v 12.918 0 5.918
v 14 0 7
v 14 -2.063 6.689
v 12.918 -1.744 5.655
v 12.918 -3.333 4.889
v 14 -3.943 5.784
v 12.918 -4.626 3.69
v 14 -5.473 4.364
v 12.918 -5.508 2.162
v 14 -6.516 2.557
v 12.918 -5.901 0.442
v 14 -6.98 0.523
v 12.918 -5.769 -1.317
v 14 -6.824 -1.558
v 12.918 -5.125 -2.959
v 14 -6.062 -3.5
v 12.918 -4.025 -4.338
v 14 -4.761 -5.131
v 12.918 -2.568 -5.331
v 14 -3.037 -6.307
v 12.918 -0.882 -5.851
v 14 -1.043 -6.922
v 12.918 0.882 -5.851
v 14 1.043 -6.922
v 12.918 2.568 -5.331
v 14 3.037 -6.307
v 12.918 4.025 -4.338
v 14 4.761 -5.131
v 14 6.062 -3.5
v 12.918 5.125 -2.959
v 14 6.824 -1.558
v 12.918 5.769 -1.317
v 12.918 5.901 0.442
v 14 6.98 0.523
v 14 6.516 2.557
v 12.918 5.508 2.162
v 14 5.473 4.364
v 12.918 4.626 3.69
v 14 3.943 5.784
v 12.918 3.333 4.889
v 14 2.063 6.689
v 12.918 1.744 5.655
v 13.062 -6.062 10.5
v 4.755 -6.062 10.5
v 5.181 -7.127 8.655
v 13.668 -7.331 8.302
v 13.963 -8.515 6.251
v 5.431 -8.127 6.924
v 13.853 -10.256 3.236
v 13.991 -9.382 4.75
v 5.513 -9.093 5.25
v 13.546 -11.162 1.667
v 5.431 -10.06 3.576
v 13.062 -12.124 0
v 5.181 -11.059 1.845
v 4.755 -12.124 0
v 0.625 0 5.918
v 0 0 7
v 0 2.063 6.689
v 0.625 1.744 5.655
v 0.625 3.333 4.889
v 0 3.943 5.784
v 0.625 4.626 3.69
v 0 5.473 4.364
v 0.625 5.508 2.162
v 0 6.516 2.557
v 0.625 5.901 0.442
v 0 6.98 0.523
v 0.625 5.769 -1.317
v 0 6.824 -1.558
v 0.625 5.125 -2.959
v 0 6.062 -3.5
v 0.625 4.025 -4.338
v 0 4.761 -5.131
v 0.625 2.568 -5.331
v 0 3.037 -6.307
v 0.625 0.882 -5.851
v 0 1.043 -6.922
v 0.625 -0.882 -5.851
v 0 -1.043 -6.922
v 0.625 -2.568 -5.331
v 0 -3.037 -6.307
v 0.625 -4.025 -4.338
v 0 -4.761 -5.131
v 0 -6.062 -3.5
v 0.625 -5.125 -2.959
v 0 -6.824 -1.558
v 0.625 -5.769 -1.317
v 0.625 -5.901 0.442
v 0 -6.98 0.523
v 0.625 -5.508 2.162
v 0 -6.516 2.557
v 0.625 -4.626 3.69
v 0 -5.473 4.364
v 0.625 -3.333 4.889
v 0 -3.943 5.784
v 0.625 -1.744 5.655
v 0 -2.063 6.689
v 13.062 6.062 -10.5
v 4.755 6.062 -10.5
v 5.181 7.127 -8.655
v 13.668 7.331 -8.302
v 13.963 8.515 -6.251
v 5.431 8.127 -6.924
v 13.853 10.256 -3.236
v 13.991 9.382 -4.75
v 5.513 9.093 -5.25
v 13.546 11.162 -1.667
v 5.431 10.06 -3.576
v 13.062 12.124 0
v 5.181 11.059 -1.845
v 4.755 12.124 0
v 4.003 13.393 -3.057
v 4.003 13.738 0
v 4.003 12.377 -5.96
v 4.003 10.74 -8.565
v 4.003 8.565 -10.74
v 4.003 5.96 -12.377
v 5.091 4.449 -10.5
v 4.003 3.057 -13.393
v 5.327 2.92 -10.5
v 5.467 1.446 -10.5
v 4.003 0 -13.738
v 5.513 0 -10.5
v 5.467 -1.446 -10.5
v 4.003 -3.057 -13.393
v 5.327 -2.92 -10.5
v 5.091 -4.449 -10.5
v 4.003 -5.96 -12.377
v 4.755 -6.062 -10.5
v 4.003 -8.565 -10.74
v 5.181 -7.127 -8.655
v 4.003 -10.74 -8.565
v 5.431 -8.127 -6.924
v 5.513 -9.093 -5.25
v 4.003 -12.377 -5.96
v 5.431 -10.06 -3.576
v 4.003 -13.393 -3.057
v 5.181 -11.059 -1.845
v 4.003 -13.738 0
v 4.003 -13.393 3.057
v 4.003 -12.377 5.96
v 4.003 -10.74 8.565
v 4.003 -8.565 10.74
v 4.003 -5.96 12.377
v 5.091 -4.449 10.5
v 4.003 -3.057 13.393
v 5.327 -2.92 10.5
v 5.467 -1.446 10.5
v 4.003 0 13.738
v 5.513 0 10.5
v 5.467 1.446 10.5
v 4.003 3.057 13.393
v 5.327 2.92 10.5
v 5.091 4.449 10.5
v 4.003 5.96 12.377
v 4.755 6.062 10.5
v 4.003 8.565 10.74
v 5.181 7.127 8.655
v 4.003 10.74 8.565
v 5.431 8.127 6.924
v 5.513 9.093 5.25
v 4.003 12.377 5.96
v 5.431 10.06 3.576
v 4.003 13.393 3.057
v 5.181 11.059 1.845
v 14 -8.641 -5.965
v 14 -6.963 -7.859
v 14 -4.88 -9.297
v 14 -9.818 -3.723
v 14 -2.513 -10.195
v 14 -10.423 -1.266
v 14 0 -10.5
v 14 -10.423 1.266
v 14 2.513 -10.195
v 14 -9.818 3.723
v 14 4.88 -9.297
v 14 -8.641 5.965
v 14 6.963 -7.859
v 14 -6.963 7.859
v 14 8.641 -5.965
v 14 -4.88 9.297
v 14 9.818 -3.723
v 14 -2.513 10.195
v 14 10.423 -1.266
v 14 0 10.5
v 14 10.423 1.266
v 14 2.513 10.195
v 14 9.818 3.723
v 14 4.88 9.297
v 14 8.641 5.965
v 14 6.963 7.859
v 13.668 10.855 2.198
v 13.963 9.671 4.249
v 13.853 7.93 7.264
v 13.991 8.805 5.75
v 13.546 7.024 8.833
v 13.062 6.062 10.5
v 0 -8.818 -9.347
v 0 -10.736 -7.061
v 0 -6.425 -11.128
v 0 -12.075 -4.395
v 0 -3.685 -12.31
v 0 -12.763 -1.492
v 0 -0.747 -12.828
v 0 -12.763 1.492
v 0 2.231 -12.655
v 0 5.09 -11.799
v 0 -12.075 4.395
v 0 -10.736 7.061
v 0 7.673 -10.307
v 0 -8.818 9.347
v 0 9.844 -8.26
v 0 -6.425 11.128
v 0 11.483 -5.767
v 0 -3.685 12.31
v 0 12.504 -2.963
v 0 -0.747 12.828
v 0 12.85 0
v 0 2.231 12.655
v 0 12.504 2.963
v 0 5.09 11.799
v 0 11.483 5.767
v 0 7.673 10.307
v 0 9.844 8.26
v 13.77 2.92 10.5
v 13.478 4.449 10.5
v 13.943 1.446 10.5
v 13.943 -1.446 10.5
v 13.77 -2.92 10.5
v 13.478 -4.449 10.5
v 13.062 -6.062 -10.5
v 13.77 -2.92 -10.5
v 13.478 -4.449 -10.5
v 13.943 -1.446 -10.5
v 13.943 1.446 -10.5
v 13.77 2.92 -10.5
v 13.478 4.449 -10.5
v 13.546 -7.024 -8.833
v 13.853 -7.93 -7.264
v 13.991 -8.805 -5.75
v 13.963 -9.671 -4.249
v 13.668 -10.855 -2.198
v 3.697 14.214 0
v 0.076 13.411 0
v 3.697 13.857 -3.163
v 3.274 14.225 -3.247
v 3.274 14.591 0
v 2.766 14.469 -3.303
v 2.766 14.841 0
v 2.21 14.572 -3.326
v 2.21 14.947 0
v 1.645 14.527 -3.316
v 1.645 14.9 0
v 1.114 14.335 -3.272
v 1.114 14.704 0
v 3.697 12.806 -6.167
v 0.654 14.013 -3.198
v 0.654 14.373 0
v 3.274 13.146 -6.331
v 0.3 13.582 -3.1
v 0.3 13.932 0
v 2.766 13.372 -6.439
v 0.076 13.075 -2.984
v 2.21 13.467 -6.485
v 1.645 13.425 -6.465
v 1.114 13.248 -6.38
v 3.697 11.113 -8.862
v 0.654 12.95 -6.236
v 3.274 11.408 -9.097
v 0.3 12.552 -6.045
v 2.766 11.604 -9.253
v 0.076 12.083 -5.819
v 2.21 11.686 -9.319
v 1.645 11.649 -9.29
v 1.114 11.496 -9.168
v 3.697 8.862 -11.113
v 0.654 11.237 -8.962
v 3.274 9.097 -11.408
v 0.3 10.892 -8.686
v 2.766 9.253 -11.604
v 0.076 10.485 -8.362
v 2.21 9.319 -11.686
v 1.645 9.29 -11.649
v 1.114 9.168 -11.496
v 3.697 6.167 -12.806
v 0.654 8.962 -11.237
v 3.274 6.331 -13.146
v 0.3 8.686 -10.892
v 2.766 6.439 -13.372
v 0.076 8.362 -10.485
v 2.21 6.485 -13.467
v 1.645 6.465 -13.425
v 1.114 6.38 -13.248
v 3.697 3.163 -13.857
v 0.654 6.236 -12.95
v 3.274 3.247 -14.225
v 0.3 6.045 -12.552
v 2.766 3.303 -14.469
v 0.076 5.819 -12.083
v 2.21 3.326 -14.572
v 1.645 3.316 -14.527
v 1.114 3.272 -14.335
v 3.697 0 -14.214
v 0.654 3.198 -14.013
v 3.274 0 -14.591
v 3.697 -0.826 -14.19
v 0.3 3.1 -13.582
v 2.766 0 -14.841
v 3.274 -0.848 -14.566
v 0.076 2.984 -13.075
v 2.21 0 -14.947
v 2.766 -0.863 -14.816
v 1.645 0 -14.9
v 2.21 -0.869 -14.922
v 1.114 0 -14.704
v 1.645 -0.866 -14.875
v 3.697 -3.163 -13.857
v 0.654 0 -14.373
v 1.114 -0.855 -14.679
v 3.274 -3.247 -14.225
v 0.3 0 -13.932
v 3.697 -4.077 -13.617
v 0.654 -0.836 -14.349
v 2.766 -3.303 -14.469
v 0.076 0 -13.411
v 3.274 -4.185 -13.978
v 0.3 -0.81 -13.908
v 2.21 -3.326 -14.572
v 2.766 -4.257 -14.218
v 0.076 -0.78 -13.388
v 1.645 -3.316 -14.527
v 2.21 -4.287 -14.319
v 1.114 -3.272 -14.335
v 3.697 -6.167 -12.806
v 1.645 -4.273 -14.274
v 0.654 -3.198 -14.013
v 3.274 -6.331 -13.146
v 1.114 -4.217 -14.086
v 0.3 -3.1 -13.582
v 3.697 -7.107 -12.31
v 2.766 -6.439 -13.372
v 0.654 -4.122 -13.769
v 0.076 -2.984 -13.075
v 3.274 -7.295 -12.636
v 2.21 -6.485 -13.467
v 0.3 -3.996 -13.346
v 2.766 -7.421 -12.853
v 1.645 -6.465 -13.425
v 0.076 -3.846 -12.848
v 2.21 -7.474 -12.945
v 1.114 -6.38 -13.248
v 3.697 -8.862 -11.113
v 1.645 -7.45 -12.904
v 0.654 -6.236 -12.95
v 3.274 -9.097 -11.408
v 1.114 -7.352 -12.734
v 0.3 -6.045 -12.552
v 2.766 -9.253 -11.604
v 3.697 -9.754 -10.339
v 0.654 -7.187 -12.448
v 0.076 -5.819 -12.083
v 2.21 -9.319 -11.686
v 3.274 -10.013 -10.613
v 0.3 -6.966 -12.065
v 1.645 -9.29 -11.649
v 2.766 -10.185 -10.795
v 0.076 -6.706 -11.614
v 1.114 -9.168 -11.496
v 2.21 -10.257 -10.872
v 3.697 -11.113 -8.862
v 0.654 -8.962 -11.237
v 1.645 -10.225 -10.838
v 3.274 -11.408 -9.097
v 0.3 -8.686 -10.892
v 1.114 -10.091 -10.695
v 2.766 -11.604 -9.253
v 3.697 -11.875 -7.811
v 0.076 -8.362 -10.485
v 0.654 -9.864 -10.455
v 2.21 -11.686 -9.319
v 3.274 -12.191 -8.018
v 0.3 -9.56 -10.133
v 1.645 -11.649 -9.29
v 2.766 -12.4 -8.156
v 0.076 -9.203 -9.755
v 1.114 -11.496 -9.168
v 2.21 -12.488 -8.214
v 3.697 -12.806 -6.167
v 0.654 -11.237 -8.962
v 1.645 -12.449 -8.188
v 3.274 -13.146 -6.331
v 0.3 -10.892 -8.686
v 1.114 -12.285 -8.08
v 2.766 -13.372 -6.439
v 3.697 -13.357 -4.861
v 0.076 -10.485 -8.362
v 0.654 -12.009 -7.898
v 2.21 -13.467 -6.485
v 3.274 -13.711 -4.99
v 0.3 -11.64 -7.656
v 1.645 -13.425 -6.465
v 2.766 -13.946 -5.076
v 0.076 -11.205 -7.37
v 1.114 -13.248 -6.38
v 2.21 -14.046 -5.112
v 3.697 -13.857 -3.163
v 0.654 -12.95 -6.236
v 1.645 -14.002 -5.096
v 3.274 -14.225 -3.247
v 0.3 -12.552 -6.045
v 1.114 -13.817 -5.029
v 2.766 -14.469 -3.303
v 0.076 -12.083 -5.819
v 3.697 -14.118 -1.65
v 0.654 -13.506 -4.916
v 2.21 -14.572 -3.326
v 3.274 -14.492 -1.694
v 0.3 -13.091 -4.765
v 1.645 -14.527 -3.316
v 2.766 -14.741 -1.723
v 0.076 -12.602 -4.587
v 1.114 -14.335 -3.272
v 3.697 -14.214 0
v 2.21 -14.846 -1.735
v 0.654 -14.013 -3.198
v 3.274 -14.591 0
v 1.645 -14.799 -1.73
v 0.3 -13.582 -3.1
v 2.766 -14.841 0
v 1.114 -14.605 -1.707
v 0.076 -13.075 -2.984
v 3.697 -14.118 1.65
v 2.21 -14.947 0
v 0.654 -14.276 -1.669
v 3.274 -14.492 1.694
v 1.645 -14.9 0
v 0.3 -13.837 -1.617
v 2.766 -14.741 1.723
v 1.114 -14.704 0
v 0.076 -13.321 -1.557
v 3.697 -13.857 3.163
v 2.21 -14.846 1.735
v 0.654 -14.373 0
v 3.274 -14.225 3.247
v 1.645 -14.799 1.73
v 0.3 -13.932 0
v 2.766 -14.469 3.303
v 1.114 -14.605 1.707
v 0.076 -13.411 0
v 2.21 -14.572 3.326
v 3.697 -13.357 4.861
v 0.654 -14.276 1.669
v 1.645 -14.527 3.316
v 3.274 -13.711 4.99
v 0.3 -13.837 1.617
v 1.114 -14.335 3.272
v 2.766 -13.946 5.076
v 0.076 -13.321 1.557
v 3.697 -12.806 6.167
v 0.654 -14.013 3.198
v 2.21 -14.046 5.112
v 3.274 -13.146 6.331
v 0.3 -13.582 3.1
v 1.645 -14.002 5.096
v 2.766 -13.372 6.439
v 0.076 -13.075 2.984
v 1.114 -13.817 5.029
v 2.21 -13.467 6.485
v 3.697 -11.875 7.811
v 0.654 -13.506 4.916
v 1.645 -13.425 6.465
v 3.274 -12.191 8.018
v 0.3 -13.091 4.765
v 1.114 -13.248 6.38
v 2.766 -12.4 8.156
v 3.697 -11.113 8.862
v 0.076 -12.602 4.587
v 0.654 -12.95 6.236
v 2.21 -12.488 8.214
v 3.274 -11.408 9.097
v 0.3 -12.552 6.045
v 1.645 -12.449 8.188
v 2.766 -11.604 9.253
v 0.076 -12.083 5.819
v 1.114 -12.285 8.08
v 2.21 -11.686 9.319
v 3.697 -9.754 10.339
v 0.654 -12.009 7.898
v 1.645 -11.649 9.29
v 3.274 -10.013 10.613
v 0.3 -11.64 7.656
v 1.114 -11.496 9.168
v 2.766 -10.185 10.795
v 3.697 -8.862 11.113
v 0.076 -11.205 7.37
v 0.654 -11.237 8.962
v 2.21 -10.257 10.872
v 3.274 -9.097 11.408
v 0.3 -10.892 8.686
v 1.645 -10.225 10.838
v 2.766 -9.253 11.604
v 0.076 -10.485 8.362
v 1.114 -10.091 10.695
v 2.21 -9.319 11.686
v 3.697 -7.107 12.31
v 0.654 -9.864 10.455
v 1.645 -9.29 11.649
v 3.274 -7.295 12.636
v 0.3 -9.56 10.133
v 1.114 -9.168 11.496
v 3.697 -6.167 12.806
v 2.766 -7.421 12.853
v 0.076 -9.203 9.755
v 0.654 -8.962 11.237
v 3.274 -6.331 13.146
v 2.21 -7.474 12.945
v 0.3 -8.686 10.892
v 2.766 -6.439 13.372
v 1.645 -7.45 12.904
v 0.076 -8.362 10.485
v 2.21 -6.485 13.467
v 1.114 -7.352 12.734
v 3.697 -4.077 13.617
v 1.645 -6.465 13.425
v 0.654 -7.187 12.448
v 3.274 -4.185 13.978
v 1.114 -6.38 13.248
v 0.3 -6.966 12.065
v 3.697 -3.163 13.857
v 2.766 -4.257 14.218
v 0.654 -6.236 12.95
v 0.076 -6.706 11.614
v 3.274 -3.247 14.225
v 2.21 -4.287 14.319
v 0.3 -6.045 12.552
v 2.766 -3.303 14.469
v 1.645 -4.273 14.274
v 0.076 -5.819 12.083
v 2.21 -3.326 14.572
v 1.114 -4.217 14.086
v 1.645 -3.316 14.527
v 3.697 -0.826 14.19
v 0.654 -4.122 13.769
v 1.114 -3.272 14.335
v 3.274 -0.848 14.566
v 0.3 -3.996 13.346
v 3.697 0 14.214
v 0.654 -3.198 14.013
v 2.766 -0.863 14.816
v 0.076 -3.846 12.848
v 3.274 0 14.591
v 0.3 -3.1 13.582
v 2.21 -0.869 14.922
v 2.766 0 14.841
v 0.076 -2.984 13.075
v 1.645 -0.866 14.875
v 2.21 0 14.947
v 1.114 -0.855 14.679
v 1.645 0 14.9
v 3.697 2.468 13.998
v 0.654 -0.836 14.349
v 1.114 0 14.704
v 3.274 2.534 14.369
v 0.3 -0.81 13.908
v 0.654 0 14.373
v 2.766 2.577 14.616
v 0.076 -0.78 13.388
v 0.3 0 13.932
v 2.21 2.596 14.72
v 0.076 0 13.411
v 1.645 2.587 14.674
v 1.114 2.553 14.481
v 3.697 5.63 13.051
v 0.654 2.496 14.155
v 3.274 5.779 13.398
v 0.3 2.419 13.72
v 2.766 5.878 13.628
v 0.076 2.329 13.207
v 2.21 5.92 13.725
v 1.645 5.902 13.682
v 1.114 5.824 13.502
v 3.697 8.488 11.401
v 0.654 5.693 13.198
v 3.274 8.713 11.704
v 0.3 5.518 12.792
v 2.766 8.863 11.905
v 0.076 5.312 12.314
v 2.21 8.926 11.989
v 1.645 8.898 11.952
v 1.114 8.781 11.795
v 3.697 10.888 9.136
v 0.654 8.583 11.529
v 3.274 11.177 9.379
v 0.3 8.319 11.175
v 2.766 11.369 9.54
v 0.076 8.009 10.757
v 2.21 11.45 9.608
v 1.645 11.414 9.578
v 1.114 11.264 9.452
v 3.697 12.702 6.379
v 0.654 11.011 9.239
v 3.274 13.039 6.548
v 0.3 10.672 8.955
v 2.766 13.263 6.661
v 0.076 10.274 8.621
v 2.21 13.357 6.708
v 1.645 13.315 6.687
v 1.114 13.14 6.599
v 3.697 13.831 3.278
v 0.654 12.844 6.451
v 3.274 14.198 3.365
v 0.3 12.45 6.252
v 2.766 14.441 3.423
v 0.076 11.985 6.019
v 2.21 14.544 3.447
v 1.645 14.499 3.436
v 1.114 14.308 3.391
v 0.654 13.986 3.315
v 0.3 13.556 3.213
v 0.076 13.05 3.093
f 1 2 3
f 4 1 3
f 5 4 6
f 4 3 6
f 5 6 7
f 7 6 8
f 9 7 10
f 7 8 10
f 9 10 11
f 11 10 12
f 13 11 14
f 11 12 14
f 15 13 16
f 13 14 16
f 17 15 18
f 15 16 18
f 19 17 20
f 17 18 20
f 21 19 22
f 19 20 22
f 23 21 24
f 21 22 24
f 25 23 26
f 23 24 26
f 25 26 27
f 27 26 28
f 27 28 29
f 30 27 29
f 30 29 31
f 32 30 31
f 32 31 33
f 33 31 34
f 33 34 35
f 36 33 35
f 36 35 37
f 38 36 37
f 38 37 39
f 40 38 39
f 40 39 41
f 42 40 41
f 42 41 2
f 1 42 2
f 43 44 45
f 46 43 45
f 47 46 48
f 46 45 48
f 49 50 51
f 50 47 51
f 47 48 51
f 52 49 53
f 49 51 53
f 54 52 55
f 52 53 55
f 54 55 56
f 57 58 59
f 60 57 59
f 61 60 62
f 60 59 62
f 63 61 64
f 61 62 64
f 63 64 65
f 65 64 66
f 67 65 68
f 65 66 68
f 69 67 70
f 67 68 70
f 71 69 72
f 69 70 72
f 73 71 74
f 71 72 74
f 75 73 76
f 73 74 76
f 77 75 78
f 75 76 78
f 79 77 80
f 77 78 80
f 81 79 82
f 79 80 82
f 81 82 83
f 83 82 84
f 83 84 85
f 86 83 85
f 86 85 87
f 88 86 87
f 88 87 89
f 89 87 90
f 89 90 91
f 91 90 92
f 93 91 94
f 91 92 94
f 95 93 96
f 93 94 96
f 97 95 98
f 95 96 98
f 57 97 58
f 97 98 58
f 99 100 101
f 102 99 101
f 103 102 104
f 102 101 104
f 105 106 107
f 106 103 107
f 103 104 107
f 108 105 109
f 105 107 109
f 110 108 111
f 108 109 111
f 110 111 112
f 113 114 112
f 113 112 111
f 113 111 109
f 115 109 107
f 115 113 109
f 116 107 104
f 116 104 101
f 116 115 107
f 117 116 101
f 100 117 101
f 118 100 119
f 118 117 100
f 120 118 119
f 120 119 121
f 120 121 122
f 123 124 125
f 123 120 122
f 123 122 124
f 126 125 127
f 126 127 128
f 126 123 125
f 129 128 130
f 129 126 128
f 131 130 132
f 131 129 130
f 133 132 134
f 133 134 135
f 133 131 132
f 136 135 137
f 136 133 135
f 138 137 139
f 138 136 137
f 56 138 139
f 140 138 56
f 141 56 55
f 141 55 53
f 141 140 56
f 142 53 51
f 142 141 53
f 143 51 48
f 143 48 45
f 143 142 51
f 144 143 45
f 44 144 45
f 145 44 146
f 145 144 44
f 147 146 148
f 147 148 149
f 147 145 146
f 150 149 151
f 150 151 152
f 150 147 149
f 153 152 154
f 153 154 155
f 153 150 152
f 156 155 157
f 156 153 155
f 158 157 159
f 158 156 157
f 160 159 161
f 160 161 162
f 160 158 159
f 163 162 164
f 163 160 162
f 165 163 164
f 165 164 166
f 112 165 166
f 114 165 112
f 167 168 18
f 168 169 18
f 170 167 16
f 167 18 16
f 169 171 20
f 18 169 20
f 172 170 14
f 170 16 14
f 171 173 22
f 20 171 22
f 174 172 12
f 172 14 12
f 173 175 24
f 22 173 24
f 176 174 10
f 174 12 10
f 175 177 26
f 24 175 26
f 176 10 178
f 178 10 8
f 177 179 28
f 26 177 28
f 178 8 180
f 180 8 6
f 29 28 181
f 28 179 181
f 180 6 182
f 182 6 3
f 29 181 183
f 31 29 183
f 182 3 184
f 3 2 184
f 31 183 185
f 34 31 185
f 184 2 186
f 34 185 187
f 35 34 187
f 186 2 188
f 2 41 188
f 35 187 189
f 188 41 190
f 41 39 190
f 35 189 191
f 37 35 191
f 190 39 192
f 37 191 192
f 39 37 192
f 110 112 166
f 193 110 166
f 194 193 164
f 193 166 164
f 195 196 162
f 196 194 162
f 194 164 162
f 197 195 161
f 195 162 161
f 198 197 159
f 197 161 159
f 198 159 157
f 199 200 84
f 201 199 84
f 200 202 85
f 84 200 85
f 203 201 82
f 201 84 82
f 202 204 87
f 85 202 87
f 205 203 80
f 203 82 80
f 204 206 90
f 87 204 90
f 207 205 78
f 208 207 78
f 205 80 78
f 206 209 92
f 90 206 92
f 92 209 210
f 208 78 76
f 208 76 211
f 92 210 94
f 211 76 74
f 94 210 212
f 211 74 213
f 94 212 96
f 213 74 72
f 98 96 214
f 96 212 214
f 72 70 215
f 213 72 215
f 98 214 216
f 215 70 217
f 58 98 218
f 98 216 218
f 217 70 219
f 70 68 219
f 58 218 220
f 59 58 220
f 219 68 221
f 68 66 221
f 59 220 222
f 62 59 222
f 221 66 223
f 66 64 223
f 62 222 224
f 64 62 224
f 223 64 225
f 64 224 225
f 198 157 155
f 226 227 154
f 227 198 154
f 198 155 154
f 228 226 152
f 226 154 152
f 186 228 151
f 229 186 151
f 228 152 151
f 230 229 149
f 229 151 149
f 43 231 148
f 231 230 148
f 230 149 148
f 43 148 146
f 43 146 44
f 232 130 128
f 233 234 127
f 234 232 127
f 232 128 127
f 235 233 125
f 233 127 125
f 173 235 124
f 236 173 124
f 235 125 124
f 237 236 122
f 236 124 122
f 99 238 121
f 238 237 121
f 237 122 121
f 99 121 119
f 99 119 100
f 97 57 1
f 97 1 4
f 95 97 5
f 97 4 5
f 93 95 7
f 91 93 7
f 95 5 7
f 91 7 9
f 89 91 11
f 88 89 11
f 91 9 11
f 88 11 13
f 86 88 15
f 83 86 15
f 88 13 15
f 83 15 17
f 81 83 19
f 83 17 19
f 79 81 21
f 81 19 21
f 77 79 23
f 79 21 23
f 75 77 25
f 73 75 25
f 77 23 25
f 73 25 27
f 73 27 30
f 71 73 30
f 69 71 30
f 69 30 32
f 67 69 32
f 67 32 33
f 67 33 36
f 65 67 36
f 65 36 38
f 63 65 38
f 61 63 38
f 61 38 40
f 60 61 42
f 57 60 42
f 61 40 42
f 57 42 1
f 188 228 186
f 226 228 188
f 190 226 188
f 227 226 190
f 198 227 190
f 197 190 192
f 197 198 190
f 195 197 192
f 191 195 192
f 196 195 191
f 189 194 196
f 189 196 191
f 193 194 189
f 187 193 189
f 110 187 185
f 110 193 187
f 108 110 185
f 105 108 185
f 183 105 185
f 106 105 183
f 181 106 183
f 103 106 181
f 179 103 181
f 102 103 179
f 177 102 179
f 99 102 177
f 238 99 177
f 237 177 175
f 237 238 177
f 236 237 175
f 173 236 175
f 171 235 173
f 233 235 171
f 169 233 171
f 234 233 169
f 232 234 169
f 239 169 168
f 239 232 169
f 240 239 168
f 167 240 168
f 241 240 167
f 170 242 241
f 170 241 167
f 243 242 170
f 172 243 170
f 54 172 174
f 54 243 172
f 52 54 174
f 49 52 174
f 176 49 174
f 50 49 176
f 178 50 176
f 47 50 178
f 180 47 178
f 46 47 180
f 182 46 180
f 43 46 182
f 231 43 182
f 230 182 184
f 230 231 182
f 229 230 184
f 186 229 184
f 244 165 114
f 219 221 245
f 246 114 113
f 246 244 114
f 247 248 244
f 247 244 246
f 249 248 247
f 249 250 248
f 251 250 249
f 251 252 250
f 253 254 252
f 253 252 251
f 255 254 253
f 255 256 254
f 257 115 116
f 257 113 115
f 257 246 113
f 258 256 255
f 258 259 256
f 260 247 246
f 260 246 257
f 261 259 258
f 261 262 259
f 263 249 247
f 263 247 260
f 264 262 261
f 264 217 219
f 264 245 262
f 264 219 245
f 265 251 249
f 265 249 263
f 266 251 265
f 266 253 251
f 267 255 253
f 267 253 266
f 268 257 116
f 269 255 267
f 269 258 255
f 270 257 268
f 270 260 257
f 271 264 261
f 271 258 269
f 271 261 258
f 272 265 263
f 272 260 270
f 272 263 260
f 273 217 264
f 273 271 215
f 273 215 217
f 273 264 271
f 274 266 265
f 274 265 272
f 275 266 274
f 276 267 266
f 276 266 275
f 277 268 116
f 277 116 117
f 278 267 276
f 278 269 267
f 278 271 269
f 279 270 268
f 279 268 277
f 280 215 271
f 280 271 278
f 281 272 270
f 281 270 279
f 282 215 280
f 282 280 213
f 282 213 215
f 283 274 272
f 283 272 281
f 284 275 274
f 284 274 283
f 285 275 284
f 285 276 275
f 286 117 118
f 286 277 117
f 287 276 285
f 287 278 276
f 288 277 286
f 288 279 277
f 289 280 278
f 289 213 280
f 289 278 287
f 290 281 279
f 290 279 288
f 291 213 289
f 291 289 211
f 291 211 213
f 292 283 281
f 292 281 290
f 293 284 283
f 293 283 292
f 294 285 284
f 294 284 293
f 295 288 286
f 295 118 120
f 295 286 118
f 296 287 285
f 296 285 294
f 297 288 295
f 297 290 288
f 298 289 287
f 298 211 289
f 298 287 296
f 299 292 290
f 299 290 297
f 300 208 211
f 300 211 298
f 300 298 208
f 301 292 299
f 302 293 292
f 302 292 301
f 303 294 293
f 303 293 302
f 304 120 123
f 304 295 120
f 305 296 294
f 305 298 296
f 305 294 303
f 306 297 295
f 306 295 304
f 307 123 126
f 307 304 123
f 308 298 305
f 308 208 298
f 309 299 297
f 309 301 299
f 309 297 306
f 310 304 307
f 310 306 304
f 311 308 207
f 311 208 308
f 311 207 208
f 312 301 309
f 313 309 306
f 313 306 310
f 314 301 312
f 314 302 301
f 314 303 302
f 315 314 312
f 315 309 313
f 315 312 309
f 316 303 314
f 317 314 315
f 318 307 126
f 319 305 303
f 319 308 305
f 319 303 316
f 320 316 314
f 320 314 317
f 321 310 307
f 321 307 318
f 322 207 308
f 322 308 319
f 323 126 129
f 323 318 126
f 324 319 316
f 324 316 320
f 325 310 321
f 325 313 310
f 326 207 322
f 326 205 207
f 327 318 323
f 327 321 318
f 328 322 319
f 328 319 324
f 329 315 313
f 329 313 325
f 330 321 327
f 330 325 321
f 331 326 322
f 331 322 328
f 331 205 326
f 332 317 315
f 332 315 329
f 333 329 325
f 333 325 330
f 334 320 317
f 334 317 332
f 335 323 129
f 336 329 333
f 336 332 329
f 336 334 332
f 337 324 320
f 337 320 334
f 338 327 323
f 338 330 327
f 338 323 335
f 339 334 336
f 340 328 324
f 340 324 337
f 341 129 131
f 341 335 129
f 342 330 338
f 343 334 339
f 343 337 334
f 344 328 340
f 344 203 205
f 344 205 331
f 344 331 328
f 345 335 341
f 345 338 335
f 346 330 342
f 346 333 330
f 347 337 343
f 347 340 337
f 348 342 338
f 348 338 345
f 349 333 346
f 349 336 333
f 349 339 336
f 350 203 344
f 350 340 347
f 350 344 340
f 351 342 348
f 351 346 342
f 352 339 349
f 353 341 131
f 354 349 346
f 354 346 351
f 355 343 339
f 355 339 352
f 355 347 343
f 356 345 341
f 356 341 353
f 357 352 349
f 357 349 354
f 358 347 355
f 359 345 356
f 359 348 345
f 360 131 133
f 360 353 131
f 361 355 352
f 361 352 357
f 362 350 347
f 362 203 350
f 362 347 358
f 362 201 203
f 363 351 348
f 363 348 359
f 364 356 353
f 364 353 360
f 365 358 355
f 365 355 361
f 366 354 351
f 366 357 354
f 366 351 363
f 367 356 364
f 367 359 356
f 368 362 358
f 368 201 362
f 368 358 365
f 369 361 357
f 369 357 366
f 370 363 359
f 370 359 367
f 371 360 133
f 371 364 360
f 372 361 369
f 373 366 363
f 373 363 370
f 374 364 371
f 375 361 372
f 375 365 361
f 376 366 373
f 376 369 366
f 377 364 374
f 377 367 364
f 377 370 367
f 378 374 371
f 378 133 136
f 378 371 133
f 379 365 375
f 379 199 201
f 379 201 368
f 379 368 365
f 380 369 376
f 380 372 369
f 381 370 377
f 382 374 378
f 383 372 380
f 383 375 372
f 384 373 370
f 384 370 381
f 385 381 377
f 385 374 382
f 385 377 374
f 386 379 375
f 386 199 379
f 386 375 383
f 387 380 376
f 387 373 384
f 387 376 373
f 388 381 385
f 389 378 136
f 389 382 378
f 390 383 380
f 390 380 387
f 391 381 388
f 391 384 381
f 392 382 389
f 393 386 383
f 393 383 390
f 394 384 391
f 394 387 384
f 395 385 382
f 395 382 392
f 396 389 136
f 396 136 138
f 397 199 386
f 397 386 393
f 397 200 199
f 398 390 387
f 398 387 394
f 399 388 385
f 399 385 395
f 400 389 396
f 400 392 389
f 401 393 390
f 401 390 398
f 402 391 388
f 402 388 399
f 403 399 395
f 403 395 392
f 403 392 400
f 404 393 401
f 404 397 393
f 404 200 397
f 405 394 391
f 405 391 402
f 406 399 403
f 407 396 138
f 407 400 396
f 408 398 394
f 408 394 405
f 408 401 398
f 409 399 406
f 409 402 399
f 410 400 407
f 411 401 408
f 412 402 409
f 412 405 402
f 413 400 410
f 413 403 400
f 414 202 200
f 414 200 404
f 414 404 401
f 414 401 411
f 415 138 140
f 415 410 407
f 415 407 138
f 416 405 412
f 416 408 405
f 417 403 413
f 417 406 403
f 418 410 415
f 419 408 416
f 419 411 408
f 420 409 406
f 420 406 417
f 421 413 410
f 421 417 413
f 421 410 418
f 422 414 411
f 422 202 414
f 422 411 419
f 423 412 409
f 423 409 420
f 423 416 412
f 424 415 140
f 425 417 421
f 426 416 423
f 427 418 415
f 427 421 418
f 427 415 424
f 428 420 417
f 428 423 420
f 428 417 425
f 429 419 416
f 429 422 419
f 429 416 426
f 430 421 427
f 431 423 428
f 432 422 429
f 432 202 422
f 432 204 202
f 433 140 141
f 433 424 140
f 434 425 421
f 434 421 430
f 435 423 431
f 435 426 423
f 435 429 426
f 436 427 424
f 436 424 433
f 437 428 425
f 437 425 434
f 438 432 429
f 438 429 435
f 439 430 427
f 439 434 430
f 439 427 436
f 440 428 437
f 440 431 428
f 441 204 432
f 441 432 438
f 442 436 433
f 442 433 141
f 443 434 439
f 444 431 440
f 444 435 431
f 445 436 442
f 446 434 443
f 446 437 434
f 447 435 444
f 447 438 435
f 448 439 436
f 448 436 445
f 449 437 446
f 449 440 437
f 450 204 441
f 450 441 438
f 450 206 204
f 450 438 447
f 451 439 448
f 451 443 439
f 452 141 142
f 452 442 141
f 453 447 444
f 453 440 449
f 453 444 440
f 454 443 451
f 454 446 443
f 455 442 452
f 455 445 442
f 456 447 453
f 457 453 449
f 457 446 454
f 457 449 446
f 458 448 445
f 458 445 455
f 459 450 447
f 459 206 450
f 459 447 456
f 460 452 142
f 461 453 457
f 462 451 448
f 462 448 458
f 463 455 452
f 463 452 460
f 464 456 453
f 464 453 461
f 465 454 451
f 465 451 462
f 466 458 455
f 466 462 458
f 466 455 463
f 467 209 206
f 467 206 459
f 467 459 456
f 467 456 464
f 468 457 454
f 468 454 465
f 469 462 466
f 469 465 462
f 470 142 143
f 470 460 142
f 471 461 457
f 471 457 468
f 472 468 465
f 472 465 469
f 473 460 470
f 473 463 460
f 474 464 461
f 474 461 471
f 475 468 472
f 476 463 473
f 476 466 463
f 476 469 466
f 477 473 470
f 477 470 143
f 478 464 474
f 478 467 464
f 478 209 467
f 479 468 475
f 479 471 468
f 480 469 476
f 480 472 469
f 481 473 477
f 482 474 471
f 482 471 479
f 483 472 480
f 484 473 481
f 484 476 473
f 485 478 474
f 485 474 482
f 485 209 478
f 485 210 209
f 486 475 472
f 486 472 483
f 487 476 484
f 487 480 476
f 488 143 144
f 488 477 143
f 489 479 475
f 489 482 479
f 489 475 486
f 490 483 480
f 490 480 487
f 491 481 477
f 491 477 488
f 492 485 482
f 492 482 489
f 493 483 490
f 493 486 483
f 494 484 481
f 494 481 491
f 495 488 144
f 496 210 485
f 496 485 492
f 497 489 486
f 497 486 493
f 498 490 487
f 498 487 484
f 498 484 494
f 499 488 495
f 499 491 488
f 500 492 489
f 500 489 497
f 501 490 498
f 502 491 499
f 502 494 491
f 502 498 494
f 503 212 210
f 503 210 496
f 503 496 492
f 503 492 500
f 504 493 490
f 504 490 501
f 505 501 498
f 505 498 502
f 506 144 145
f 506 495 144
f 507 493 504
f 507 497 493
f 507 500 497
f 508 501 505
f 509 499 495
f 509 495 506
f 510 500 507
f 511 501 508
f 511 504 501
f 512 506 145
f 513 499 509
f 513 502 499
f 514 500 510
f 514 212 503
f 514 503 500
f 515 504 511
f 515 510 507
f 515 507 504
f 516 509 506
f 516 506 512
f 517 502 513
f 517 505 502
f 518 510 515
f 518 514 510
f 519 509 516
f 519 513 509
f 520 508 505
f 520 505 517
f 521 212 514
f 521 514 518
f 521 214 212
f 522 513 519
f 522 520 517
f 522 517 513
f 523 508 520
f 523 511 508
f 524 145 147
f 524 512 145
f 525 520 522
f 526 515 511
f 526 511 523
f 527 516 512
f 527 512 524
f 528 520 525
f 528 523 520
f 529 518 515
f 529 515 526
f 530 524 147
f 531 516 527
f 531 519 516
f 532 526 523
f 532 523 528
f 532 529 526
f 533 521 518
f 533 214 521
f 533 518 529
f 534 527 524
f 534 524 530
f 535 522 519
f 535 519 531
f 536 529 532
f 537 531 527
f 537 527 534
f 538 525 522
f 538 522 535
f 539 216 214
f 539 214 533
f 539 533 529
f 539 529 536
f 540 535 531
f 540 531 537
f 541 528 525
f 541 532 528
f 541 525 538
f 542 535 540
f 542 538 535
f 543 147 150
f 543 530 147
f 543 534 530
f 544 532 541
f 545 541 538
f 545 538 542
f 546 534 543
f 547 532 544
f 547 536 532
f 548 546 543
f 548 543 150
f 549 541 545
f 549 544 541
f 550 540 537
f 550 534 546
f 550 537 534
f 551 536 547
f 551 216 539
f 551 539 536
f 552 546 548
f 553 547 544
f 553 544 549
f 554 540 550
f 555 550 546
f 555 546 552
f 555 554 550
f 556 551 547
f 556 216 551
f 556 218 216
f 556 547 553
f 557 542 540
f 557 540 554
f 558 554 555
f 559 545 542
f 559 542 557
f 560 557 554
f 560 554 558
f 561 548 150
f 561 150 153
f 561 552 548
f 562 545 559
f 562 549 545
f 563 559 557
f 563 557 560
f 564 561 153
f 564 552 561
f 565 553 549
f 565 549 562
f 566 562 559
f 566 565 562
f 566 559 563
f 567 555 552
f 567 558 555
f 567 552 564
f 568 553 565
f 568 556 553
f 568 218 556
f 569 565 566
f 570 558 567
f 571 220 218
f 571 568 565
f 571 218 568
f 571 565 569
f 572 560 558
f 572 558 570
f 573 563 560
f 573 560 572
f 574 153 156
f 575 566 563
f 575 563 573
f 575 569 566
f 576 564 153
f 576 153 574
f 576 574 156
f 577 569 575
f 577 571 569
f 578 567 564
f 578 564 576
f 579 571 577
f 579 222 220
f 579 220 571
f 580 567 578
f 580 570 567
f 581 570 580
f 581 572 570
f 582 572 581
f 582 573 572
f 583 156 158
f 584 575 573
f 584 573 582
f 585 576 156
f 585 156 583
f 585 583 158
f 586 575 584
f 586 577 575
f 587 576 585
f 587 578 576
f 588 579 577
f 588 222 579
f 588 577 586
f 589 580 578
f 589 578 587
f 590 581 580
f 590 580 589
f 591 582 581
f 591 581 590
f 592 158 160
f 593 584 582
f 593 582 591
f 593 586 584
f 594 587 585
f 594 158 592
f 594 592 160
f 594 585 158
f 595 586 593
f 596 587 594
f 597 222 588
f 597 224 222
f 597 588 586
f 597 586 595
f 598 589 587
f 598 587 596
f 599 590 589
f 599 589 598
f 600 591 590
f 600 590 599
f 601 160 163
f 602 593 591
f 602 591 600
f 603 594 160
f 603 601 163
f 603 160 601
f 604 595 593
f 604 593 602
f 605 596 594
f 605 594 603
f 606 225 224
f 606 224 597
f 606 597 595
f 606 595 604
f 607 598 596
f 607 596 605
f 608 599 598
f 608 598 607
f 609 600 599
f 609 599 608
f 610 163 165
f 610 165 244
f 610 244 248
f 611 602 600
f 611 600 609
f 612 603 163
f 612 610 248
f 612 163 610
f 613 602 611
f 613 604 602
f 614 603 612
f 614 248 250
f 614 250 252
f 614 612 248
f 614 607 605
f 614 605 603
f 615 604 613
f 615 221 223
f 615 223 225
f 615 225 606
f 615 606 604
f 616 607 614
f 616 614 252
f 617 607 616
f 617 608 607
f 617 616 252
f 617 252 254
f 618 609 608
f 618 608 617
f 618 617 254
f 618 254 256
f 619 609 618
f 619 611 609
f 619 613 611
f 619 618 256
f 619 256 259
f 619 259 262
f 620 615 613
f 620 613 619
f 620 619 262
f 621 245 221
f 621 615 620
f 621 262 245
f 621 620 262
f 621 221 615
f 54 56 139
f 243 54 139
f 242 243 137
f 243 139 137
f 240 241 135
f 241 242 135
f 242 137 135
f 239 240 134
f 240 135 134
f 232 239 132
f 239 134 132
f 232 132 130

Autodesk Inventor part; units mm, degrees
ref_plane "YZ Plane" through (0, 0, 0) normal (1, 0, 0) x (0, 1, 0)
ref_plane "XZ Plane" through (0, 0, 0) normal (0, 1, 0) x (-1, 0, 0)
sketch "Sketch1" plane through (0, 0, 0) normal (0, 0, 1) x (1, 0, 0)
  line L0 (-3.2274, 0) -> (16.8712, 0) projected
  line L1 (5.5129, 10.5) -> (4.0032, 13.7375)
  line L2 (5.5129, 10.5) -> (14, 10.5) construction
  line L3 (14, 10.5) -> (14, 0) construction
  arc A0 (4.0032, 13.7375) -> (0, 12.85) centre (2.1, 12.85) ccw
  line L4 (5.5129, 10.5) -> (5.5129, 0)
  line L5 (0, -3.0688) -> (0, 18.4128) projected
  point P0 (0, 0)
  dimension "d2" = 21
  dimension "d4" = 29.9
  dimension "d5" = 2.1
  dimension "d15" = 14
  dimension "d16" = 25
revolve "Ring" add sketch "Sketch1" angle 360 about axis through (-10, 0, 0) along (1, 0, 0)
sketch "Sketch2" plane through (0, 0, 0) normal (-1, 0, 0) x (0, 0, 1)
  circle A0 centre (0, 0) radius 4.9
  line L0 (-10.5, -6.0622) -> (-10.5, 6.0622)
  line L1 (-10.5, 6.0622) -> (0, 12.1244)
  line L2 (0, 12.1244) -> (10.5, 6.0622)
  line L3 (10.5, 6.0622) -> (10.5, -6.0622)
  line L4 (10.5, -6.0622) -> (0, -12.1244)
  line L5 (0, -12.1244) -> (-10.5, -6.0622)
  circle A1 centre (0, 0) radius 12.85 projected
  dimension "d6" = 24.2487
extrude "Body" add sketch "Sketch2" against normal blind 14 contours A0 | L0 L1 L2 L3 L4 L5
sketch "Sketch3" plane through (0, 0, 0) normal (0, 0, 1) x (1, 0, 0)
  line L0 (4.7555, 12.1244) -> (14, 12.1244) projected
  line L1 (14, 6.0622) -> (14, 12.1244) projected
  line L2 (0, -12.85) -> (0, 12.85) projected
  line L3 (-2.8, 0) -> (16.8, 0) projected
  line L4 (13.0622, 12.1244) -> (14, 10.5)
  dimension "d10" = 30
  dimension "d11" = 21
revolve "Chamfer1" cut sketch "Sketch3" angle 360 about axis through (-10, 0, 0) along (1, 0, 0)
sketch "Sketch4" plane through (0, 0, 0) normal (-1, 0, 0) x (0, 0, 1)
  circle A0 centre (0, 0) radius 12.85 projected
hole "Thread" at (0, 0, 0) direction (1, 0, 0) diameter 11.835 end through all thread size "M14x2" class "6H" standard "ISO Metric profile"
chamfer "Chamfer2" distance 1.0825 angle 30 1 edges at (0, 0, -5.9175) measured on face at (0, 10.4003, -1.2628)
ref_plane "Work Plane1" through (44.5423, 0, 0) normal (0, 0, -1) x (-1, 0, 0)
chamfer "Chamfer3" distance 1.0825 angle 45 1 edges at (14, 0, -5.9175)
equation "\"d6\" = 1.1547 * SW"
equation "\"d7\" = KOH"
equation "\"d12\" = -0.5 * GD1 + 0.5 * NND"
equation "\"d46\" = -0.5 * GD1 + 0.5 * NND"
equation "\"d51\" = -0.5 * GD1 + 0.5 * NND"
equation "\"d2\" = SW"
equation "\"d4\" = LADI"
equation "\"d5\" = PHH"
equation "\"d15\" = KOH"
equation "\"d16\" = KEWI"
equation "\"d10\" = ANG1"
equation "\"d11\" = SW0"
equation "\"ANG1\" = 30deg"
equation "\"KEWI\" = 25deg"
equation "\"NND\" = 14"
equation "\"LADI\" = 29.9"
equation "\"SW\" = 21"
equation "\"PHH\" = 2.1"
equation "\"KOH\" = NND"
equation "\"SW0\" = 21"
equation "\"d1\" = LADI"
equation "\"d3\" = PHH"
equation "\"GUL\" = 0.541266 * PTC"
equation "\"RR\" = PHH"
equation "\"THREADDIA\" = 14"
equation "\"TOA\" = 30deg"
equation "\"PTC\" = 2"
equation "\"GAL\" = 0.541266 * PTC"
equation "\"E0\" = 1.155 * SW"
equation "\"GD1\" = 11.834936"
properties part number "ISO 4161 - M14" material "Stainless Steel"
